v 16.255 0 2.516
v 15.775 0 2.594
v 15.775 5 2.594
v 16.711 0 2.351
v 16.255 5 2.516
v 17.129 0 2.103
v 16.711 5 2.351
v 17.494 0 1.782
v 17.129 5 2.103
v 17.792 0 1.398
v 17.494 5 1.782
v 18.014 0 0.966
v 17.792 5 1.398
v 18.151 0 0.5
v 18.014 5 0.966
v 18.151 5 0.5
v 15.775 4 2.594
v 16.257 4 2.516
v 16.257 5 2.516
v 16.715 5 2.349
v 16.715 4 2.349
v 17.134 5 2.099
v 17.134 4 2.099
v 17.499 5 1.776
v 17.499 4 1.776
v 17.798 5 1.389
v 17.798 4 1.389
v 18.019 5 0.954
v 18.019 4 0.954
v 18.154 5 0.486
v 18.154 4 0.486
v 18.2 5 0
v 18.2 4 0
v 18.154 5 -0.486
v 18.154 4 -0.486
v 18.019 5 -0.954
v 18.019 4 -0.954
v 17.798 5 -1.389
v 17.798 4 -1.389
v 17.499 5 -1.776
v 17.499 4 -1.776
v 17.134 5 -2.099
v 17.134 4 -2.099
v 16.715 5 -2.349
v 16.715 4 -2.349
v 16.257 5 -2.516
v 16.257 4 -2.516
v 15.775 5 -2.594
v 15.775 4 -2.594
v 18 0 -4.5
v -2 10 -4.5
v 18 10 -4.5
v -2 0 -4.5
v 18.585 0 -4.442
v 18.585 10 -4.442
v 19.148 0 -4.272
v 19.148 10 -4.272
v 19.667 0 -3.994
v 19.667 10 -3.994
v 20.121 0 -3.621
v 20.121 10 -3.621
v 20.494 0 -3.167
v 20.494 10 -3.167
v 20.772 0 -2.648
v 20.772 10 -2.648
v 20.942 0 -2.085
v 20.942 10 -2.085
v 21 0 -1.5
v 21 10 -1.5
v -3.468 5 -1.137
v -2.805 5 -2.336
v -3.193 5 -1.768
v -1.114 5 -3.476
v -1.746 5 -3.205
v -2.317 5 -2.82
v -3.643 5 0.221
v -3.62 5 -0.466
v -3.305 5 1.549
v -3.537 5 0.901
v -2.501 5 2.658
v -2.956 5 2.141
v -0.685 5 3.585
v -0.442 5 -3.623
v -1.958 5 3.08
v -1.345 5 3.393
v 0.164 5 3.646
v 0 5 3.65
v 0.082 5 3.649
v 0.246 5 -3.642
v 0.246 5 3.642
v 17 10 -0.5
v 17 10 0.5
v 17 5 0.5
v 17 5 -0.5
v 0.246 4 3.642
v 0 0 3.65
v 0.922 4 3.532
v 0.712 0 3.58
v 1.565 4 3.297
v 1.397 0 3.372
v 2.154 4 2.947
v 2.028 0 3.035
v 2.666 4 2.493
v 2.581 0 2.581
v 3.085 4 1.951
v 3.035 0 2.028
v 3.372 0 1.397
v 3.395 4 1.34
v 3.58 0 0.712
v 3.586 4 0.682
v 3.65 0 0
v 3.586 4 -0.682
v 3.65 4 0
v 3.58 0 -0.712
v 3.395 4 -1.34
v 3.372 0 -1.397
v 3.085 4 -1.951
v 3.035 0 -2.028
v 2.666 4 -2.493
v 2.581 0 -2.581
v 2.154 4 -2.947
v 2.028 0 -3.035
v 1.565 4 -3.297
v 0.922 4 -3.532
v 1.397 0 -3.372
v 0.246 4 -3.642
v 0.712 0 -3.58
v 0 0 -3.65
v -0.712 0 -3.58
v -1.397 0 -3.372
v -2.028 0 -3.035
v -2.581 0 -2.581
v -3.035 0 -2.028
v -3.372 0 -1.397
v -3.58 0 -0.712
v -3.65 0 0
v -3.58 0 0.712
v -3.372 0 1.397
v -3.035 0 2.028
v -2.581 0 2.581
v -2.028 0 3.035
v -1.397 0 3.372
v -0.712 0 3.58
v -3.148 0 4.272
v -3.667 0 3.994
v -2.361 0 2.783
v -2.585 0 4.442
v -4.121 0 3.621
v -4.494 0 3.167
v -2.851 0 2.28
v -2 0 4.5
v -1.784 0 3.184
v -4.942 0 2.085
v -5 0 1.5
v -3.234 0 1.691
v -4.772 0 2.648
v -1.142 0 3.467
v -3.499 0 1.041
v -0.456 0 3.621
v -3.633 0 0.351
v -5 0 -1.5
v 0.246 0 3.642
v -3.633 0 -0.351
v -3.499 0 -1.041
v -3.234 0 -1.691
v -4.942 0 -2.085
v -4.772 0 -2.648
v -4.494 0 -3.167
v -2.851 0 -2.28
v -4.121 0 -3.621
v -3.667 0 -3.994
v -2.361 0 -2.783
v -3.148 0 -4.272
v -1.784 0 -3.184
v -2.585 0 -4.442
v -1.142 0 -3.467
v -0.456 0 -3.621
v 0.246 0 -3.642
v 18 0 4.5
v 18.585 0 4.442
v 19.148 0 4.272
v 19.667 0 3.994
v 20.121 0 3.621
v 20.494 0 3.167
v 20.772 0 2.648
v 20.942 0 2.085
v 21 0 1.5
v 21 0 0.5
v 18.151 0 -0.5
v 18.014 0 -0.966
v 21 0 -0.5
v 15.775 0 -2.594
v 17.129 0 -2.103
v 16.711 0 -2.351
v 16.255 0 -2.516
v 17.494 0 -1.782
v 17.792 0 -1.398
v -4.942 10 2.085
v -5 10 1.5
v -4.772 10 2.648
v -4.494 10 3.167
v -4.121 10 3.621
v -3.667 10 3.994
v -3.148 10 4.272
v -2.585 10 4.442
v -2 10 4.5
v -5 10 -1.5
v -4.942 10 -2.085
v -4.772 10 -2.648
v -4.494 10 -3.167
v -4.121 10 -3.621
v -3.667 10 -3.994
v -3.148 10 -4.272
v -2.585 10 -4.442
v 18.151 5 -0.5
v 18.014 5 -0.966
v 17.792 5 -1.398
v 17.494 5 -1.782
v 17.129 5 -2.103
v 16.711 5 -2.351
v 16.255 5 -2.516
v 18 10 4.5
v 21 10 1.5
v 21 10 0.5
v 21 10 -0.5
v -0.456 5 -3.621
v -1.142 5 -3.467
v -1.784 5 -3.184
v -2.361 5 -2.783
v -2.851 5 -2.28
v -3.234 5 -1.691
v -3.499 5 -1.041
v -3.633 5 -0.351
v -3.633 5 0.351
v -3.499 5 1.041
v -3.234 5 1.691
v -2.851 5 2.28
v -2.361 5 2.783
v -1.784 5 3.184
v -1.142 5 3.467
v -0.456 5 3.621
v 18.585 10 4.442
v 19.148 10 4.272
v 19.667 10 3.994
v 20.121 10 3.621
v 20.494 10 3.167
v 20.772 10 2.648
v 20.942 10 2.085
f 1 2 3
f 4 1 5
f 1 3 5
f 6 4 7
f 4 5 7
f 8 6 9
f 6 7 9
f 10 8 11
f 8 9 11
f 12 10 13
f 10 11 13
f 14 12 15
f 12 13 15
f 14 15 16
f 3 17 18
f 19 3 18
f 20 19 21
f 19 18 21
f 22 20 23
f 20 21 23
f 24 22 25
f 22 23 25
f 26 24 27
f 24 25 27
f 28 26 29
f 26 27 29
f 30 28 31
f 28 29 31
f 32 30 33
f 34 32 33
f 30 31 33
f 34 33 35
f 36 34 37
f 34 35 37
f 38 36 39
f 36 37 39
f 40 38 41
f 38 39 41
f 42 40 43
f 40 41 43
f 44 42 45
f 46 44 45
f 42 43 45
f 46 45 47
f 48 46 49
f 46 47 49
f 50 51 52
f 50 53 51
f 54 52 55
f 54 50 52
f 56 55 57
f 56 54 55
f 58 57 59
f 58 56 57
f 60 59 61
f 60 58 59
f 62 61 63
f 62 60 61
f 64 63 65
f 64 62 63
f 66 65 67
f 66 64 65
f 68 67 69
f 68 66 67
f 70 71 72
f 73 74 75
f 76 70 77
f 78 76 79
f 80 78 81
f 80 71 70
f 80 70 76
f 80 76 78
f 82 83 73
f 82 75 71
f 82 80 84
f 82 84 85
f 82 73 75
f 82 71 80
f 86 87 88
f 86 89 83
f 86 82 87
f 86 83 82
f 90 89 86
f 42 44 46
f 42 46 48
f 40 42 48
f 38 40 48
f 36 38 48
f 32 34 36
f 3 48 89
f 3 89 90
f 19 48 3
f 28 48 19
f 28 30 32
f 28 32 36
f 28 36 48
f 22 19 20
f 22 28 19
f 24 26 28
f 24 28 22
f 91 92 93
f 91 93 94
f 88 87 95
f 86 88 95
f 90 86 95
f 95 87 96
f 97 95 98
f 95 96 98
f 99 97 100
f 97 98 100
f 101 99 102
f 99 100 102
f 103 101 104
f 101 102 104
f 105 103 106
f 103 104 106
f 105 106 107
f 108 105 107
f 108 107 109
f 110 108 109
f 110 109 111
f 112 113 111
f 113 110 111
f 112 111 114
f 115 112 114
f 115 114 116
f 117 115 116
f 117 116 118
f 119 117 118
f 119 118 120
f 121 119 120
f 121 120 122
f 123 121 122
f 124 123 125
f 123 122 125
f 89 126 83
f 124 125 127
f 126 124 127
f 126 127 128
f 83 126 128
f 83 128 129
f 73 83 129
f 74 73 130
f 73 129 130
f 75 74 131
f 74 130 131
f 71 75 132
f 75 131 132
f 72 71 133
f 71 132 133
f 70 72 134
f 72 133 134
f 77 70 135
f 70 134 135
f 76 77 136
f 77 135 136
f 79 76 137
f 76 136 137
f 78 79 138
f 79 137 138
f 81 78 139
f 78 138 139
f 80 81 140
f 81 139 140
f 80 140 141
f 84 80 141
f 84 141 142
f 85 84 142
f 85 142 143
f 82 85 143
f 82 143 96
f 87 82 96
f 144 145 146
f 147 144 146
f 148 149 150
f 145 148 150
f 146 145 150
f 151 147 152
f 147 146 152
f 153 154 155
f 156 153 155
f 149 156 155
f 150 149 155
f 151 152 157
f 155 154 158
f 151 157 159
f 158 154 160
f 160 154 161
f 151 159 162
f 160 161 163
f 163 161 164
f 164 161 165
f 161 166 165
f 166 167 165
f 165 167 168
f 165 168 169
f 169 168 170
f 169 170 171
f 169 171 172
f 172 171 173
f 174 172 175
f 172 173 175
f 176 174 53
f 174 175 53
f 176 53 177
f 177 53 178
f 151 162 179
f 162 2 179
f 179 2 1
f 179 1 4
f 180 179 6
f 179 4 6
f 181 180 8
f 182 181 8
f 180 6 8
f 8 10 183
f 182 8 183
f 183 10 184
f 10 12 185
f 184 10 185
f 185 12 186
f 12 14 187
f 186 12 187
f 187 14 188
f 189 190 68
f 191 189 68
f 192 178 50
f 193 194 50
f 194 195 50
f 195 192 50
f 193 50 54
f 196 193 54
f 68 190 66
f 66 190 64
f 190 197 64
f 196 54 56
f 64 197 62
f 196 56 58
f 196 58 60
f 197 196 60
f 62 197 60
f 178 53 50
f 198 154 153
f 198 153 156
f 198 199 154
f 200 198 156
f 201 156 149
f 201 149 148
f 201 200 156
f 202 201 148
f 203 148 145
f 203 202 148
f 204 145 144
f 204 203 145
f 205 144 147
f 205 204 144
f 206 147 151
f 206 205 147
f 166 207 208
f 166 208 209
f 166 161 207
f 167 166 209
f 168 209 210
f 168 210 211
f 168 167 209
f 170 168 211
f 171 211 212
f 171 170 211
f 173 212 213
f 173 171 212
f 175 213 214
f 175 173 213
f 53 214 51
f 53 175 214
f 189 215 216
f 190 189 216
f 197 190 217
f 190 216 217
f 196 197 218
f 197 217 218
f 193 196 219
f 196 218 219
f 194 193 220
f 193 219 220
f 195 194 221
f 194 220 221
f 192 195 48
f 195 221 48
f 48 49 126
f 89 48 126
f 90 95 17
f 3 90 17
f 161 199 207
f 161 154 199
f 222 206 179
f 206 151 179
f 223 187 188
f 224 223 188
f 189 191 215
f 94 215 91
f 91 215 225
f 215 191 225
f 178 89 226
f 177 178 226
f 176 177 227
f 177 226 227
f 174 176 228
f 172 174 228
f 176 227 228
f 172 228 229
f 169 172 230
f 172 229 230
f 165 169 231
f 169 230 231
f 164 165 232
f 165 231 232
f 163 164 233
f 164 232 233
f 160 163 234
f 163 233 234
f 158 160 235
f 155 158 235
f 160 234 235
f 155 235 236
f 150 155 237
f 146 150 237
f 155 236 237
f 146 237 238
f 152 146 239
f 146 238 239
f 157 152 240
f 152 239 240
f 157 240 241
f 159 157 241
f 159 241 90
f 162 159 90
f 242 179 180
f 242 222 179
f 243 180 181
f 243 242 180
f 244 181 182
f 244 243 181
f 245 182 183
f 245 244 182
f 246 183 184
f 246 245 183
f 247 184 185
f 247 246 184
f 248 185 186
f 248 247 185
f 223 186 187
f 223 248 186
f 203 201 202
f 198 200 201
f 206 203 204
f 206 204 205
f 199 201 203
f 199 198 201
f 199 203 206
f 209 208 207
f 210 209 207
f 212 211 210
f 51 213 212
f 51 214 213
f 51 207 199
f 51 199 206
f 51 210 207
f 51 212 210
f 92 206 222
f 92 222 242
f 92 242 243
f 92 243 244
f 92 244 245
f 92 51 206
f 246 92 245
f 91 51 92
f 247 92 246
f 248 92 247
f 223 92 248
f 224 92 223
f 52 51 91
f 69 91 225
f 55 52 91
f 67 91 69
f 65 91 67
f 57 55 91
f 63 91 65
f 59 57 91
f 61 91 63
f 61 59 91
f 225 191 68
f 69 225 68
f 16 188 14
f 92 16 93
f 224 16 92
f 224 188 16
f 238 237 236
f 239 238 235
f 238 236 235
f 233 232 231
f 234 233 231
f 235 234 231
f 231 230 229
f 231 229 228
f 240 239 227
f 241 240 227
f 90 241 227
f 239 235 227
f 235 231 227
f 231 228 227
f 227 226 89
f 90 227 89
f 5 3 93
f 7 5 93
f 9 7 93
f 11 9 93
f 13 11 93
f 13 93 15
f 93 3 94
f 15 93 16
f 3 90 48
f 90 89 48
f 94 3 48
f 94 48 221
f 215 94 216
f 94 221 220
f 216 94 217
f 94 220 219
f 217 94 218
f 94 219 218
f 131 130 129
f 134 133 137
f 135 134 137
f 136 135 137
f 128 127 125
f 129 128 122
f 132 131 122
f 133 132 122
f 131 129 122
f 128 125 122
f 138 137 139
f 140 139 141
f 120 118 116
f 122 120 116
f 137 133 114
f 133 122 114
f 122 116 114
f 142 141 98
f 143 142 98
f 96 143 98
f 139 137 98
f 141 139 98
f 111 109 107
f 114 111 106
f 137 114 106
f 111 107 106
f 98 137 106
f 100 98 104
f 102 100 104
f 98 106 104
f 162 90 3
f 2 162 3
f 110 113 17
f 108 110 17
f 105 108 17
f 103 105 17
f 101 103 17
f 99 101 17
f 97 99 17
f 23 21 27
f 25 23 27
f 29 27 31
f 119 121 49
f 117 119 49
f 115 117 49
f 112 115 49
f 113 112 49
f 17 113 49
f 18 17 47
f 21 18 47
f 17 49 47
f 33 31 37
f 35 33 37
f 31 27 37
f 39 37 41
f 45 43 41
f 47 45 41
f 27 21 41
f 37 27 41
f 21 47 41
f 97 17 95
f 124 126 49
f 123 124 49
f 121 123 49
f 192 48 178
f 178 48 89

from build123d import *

# Parameters (mm, degrees)
SKETCH1_R               = 3.65
BOSS_EXTRUDE1_DEPTH     = 5
BOSS_EXTRUDE2_START     = -1
BOSS_EXTRUDE2_DEPTH     = 1
SKETCH4_W               = 26
SKETCH4_H               = 9
BOSS_EXTRUDE3_DEPTH     = 5
SKETCH5_W               = 26
SKETCH5_H               = 9
BOSS_EXTRUDE4_DEPTH     = 5
SKETCH6_W               = 1
SKETCH6_H               = 10
CUT_EXTRUDE_THIN1_DEPTH = 4
FILLET1_R               = 3
FILLET2_R               = 3


with BuildPart() as part:
    # Sketch1 → Boss-Extrude1 (new body)
    with BuildSketch(Plane(origin=(0, 0, 0), x_dir=(1, 0, 0), z_dir=(0, 1, 0))):
        with Locations(Location((0, 0, 0), (0, 0, 270))):
            Circle(SKETCH1_R)
    extrude(amount=BOSS_EXTRUDE1_DEPTH)

    # Sketch3 → Boss-Extrude2 (add)
    with BuildSketch(Plane(origin=(0, 5, 0), x_dir=(1, 0, 0), z_dir=(0, 1, 0)).offset(BOSS_EXTRUDE2_START)):
        with BuildLine():
            Line((0.245673077, -3.641722771), (15.775, -2.594103892))
            ThreePointArc((15.775, -2.594103892), (18.2, 0), (15.775, 2.594103892))
            Line((15.775, 2.594103892), (0.245673077, 3.641722771))
            ThreePointArc((0.245673077, 3.641722771), (3.65, 0), (0.245673077, -3.641722771))
        make_face()
    extrude(amount=BOSS_EXTRUDE2_DEPTH)


with BuildPart() as body_2:
    # Sketch4 → Boss-Extrude3 (new body)
    with BuildSketch(Plane(origin=(0, 5, 0), x_dir=(1, 0, 0), z_dir=(0, 1, 0))):
        with Locations((8, 0)):
            Rectangle(SKETCH4_W, SKETCH4_H)
        with BuildLine():
            Line((0.245673077, -3.641722771), (15.775, -2.594103892))
            ThreePointArc((15.775, -2.594103892), (18.2, 0), (15.775, 2.594103892))
            Line((15.775, 2.594103892), (0.245673077, 3.641722771))
            ThreePointArc((0.245673077, 3.641722771), (-3.65, 0), (0.245673077, -3.641722771))
        make_face(mode=Mode.SUBTRACT)
    extrude(amount=-BOSS_EXTRUDE3_DEPTH)

    # Sketch5 → Boss-Extrude4 (add)
    with BuildSketch(Plane(origin=(0, 5, 0), x_dir=(1, 0, 0), z_dir=(0, 1, 0))):
        with Locations((8, 0)):
            Rectangle(SKETCH5_W, SKETCH5_H)
    extrude(amount=BOSS_EXTRUDE4_DEPTH)

    # Sketch6 → Cut-Extrude-Thin1 (cut)
    with BuildSketch(Plane(origin=(21, 0, 0), x_dir=(0, 0, -1), z_dir=(1, 0, 0))):
        with Locations((0, 5)):
            Rectangle(SKETCH6_W, SKETCH6_H)
    extrude(amount=-CUT_EXTRUDE_THIN1_DEPTH, mode=Mode.SUBTRACT)

    # Fillet1
    fillet1_edges = [body_2.edges().sort_by_distance(p)[0] for p in [
        (-5, 5, -4.5),
        (-5, 5, 4.5),
    ]]
    fillet(fillet1_edges, radius=FILLET1_R)

    # Fillet2
    fillet2_edges = [body_2.edges().sort_by_distance(p)[0] for p in [
        (21, 5, -4.5),
        (21, 5, 4.5),
    ]]
    fillet(fillet2_edges, radius=FILLET2_R)


solid = Compound([part.part, body_2.part])
